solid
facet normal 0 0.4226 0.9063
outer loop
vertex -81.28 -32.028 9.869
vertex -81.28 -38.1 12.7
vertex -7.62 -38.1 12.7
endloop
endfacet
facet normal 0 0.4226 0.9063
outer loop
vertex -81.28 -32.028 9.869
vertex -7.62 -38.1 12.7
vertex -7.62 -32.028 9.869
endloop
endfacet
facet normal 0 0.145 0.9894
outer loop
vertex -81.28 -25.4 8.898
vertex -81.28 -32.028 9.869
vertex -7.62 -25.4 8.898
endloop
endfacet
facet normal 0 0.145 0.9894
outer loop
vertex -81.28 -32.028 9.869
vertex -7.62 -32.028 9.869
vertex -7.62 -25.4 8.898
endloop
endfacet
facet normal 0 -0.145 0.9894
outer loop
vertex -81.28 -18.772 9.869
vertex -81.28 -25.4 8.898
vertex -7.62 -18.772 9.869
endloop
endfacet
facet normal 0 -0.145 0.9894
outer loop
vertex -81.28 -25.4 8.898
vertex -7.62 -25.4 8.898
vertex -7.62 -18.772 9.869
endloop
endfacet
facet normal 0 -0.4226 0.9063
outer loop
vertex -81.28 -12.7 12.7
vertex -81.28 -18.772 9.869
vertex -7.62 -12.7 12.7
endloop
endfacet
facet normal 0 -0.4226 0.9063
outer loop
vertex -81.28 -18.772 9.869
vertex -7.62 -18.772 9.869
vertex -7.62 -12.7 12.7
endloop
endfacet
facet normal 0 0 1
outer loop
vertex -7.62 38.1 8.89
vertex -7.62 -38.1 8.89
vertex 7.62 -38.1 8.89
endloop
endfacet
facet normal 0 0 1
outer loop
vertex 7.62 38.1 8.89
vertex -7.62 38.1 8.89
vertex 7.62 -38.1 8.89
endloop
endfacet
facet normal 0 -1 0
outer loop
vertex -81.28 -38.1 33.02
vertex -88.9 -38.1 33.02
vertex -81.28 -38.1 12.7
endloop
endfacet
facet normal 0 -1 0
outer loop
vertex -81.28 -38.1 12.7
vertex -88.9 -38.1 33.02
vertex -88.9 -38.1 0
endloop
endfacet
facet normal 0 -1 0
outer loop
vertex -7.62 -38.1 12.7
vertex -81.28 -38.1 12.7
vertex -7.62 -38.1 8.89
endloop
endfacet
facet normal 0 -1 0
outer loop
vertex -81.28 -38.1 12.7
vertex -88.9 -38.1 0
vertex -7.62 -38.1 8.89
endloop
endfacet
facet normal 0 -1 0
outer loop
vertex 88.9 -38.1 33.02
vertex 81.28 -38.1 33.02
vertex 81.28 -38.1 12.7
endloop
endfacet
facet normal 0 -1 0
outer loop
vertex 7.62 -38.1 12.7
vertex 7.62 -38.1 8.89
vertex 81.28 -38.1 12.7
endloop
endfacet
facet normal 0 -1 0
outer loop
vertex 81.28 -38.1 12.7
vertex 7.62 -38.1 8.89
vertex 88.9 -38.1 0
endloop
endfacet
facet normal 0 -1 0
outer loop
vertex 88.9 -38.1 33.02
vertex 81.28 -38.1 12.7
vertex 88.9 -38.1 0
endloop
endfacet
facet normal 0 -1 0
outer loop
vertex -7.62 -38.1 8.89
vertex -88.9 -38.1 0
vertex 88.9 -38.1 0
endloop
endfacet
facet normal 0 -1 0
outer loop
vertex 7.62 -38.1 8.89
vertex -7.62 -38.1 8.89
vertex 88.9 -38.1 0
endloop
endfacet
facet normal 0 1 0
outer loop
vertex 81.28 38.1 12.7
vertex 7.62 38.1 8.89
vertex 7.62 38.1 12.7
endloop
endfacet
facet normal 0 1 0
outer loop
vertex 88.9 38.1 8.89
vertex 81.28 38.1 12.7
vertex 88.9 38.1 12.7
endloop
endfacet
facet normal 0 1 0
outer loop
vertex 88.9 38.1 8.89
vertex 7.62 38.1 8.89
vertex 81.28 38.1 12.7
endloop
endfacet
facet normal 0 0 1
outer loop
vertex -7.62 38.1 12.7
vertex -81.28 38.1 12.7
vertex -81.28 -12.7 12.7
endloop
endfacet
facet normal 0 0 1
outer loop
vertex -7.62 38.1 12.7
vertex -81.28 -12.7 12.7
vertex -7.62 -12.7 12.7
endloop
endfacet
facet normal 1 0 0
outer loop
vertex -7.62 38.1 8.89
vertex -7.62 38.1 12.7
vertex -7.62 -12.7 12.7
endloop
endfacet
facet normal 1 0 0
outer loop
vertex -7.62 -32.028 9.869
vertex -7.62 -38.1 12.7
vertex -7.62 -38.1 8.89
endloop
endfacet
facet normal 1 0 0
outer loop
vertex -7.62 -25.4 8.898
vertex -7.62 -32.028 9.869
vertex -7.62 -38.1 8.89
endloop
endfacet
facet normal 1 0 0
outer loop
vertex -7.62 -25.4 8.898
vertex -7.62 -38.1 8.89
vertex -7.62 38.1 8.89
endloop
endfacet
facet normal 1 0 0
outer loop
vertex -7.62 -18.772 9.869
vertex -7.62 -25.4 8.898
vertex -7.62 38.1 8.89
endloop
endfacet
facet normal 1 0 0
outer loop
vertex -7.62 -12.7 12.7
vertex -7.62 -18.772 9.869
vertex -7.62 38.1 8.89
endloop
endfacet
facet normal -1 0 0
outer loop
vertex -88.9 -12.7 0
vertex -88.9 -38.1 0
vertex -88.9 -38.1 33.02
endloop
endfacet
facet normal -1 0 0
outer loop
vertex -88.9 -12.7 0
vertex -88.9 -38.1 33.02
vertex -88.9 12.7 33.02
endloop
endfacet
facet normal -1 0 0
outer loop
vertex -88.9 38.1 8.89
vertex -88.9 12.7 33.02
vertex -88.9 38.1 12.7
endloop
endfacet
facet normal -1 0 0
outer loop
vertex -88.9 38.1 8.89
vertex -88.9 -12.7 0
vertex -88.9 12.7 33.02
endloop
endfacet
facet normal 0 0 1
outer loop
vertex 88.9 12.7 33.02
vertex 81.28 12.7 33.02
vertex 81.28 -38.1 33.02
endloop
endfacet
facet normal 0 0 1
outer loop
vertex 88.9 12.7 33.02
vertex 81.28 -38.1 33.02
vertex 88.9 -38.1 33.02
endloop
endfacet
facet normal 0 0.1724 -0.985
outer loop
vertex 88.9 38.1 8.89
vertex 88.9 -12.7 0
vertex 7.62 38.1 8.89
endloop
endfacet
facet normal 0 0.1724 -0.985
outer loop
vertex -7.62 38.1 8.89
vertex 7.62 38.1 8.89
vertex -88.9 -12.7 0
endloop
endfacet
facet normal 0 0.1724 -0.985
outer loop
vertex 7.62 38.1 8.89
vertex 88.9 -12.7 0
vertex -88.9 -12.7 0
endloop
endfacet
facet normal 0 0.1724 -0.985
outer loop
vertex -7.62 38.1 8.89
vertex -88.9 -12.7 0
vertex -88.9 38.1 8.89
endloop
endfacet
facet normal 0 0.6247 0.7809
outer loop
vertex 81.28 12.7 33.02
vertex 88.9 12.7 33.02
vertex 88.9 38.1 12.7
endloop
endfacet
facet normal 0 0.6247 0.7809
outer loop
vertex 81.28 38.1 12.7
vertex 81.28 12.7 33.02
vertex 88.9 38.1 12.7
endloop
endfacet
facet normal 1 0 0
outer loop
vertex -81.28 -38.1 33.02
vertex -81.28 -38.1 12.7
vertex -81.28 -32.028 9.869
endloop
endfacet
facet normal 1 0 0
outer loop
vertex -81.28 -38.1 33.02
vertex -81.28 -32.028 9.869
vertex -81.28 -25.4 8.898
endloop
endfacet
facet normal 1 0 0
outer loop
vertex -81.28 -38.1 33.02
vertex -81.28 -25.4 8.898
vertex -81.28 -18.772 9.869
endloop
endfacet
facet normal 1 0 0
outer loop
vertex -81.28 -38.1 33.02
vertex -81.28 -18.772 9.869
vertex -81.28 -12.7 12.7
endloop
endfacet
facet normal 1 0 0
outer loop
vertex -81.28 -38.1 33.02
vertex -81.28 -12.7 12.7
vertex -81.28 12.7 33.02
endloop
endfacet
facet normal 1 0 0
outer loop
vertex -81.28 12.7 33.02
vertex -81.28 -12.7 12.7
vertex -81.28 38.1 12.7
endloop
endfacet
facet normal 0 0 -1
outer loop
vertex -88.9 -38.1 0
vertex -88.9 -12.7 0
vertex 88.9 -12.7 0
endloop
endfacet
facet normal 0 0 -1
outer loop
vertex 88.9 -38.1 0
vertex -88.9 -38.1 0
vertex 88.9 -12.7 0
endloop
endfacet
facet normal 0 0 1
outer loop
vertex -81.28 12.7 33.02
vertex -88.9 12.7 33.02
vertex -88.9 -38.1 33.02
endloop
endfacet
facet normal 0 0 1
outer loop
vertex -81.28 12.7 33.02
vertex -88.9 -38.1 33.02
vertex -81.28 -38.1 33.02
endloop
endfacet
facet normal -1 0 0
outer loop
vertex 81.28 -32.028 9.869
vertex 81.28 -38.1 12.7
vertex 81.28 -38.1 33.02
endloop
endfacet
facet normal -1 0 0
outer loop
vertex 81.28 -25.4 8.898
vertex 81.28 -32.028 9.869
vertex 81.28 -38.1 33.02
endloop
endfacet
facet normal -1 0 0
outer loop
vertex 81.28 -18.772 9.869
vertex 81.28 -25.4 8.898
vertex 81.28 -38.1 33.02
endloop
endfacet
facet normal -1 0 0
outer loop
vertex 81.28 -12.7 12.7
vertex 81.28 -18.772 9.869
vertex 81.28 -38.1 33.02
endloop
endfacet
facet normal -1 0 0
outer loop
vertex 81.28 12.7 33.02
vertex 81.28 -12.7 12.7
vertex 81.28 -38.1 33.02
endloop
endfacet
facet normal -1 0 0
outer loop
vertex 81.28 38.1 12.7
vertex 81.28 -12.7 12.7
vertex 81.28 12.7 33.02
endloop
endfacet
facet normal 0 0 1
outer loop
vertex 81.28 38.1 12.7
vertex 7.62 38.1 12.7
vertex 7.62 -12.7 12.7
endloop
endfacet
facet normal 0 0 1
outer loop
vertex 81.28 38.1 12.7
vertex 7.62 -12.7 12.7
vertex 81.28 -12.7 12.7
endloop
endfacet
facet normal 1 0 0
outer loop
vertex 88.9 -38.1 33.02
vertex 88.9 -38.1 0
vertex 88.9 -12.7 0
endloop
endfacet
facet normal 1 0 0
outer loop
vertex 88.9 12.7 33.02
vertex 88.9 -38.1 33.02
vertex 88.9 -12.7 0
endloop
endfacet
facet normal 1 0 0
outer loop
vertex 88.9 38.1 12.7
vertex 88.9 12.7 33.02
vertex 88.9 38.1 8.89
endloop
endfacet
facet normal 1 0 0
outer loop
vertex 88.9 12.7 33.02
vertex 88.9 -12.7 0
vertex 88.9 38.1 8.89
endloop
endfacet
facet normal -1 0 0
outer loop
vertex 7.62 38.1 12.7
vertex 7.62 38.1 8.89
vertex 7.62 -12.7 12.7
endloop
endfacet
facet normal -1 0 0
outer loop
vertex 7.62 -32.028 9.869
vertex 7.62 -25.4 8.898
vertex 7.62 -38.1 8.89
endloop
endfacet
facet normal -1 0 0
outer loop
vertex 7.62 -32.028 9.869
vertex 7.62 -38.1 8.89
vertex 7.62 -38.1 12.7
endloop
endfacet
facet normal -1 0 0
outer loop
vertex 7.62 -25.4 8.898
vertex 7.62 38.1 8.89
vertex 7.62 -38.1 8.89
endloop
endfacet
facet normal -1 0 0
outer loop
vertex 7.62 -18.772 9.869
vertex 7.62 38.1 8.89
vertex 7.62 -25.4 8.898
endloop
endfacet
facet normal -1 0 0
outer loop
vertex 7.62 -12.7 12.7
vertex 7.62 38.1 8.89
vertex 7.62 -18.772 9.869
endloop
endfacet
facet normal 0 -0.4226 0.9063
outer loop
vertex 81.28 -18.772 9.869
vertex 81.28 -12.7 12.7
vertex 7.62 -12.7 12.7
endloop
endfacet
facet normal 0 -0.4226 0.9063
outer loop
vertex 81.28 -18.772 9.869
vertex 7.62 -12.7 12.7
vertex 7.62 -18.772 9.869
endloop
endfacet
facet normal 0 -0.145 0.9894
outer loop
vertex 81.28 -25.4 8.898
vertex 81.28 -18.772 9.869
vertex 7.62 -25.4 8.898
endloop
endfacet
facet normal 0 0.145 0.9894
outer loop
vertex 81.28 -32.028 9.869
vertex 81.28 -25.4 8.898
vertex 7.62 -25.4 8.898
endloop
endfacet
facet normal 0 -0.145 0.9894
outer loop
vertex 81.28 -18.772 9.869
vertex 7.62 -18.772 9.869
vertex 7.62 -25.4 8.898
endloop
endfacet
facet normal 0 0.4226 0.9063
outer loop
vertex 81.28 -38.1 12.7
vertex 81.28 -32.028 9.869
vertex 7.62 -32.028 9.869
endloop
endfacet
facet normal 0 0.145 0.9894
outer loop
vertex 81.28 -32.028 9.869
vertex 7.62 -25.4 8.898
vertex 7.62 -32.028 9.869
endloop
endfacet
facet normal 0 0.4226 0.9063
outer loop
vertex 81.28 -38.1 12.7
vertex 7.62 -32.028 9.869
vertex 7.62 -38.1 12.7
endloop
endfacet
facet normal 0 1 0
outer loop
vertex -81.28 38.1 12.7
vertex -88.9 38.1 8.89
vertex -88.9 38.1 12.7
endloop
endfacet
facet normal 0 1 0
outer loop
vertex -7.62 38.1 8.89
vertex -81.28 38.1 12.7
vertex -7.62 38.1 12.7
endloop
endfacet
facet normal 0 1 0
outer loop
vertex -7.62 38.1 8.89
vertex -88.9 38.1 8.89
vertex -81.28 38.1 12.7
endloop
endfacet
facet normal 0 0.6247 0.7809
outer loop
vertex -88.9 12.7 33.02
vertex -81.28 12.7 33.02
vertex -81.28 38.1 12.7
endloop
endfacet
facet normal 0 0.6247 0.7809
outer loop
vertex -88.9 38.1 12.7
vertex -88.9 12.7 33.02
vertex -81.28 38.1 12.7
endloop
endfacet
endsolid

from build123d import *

# Parameters (mm, degrees)
F0_W      = 177.8
F0_H      = 76.2
F1_DEPTH  = 12.7
F3_DEPTH  = 197.612
F4_W      = 7.62
F4_H      = 76.2
F5_DEPTH  = 20.32
F6_W      = 7.62
F6_H      = 76.2
F7_DEPTH  = 20.32
F9_DEPTH  = 73.66
F11_DEPTH = 73.66
F13_DEPTH = 228.6
F15_DEPTH = 228.6


with BuildPart() as f1:
    # F0 (on Top) → F1 (new body)
    with BuildSketch(Plane.XY):
        Rectangle(F0_W, F0_H)
    extrude(amount=F1_DEPTH)

    # F2 (on face) → F3 (cut)
    with BuildSketch(Plane.XZ.offset(38.1)):
        Polygon((-7.62, 8.89), (0, 8.89), (7.62, 8.89), (7.62, 12.7), (-7.62, 12.7), align=None)
    extrude(amount=-F3_DEPTH, mode=Mode.SUBTRACT)

    # F4 (on face) → F5 (join)
    with BuildSketch(Plane.XY.offset(12.7)):
        with Locations((-85.09, 0)):
            Rectangle(F4_W, F4_H)
    extrude(amount=F5_DEPTH)

    # F6 (on face) → F7 (join)
    with BuildSketch(Plane.XY.offset(12.7)):
        with Locations((85.09, 0)):
            Rectangle(F6_W, F6_H)
    extrude(amount=F7_DEPTH)

    # F8 (on face) → F9 (cut)
    with BuildSketch(Plane.YZ.offset(-7.62)):
        with BuildLine():
            Line((-12.7, 12.7), (-38.1, 12.7))
            ThreePointArc((-38.1, 12.7), (-25.4, 8.898353), (-12.7, 12.7))
        make_face()
    extrude(amount=-F9_DEPTH, mode=Mode.SUBTRACT)

    # F10 (on face) → F11 (cut)
    with BuildSketch(Plane(origin=(7.62, 0, 0), x_dir=(0, -1, 0), z_dir=(-1, 0, 0))):
        with BuildLine():
            ThreePointArc((12.7, 12.7), (25.4, 8.898353), (38.1, 12.7))
            Line((38.1, 12.7), (12.7, 12.7))
        make_face()
    extrude(amount=-F11_DEPTH, mode=Mode.SUBTRACT)

    # F12 (on face) → F13 (cut)
    with BuildSketch(Plane(origin=(-88.9, 0, 0), x_dir=(0, -1, 0), z_dir=(-1, 0, 0))):
        Polygon((-38.1, 0), (12.7, 0), (-38.1, 8.89), align=None)
    extrude(amount=-F13_DEPTH, mode=Mode.SUBTRACT)

    # F14 (on face) → F15 (cut)
    with BuildSketch(Plane.YZ.offset(88.9)):
        Polygon((38.1, 33.02), (12.7, 33.02), (38.1, 12.7), align=None)
    extrude(amount=-F15_DEPTH, mode=Mode.SUBTRACT)


solid = f1.part
